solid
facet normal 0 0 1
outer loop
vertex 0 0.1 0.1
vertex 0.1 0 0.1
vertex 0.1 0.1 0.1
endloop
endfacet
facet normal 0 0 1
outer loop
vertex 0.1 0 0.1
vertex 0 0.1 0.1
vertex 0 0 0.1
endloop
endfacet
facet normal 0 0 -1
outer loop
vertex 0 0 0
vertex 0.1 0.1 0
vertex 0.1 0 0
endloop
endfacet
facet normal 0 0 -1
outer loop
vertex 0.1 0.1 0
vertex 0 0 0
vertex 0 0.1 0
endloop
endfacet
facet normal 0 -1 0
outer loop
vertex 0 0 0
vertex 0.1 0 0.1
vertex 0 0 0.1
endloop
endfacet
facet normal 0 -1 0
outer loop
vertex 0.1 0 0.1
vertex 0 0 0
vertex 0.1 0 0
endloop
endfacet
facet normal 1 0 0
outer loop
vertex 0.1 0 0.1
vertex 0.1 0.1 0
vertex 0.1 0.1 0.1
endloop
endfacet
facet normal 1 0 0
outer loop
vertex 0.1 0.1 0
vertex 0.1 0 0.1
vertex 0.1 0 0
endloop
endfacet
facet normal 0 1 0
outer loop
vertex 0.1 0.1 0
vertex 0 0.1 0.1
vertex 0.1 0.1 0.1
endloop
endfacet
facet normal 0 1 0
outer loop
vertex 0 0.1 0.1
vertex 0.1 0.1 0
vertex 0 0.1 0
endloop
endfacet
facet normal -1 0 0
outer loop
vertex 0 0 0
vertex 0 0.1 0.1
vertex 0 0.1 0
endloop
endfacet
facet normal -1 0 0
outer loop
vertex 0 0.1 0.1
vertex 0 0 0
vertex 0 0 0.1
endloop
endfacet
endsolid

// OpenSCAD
// Tests for snapware-lid-holder.scad
// Run: openscad -o /tmp/x.stl snapware-lid-holder-test.scad
//      (add -D 'Pack="..."' / -D Set_quantity=2 etc. to test other configs)
// Non-zero exit = a test failed (assert aborts on first failure).

include <snapware-lid-holder.scad>
Piece = 99;   // suppress model geometry; tests only

// --- A: preset counts match the cited catalog listings (container totals) ---
echo(str("A: totals current=", sum(current), " 2016=", sum(old2016),
         " 2015=", sum(old2015), " 2014=", sum(old2014), " expected 19/18/15/19"));
assert(sum(current) == 19 && sum(old2016) == 18 && sum(old2015) == 15 && sum(old2014) == 19,
       "A FAIL: preset totals differ from catalog listings");

// --- B: every channel exists exactly once across pieces ---
echo(str("B: channels=", n_ch, " in pieces=", sum([for (pc = pieces) len(pc)])));
assert(sum([for (pc = pieces) len(pc)]) == n_ch, "B FAIL: channels lost or duplicated");

// --- C: lid fronts flush at Z=0; each channel has a stop exactly at its rail
// depth (Stop + L - Front_overhang) in some stop station of its piece ---
for (pc = pieces) for (k = [0:len(pc)-1]) let(r = stop_z(pc[k]),
    hits = [for (st = piece_stations(pc)) for (sk = station_stops(pc, st)) if (sk[0] == k) sk[1]]) {
  echo(str("C: ", names[pc[k][1]], " L=", pc[k][0], " stop at ", hits, " expected ", r));
  assert(len(hits) == 1 && abs(hits[0] - r) < eps, str("C FAIL: ", names[pc[k][1]], " stop missing/duplicated"));
  assert(abs(r - Stop_thickness - (clamp_mode ? (pc[k][0] + pc[k][2])/2 : pc[k][0]) + Front_overhang) < eps, "C FAIL: lid front not on the front line");
  // Whole clamp sits over this channel's ledge rail (front station .. stop).
  cs = clamp_span(pc[k]);
  echo(str("C: clamp ", cs, " rail support 0..", r - Stop_thickness));
  assert(cs[0] >= -Front_overhang - eps && cs[1] <= r - Stop_thickness + eps, "C FAIL: clamp not fully on rail");
}

// --- R: Station_length of hook in front of the stop wall (under the clamp's
// rear end) and exactly Stop_tail behind it ---
for (pc = pieces) for (k = [0:len(pc)-1]) let(sz = stop_z(pc[k]),
    st = [for (st = piece_stations(pc)) if (len([for (sk = station_stops(pc, st)) if (sk[0] == k) 1]) > 0) st][0],
    front = sz - Stop_thickness - st[0], behind = seg_end(pc, st, k) - sz) {
  echo(str("R: ", names[pc[k][1]], " hook ", front, " | stop ", Stop_thickness, " | ", behind));
  assert(front >= Station_length - eps && abs(behind - Stop_tail) < eps, "R FAIL: hook around the stop wall");
}

// --- C2: channels sorted by stop depth, deepest first, within and across pieces ---
if (n_ch > 1) for (k = [1:n_ch-1]) assert(stop_z(channels[k]) <= stop_z(channels[k-1]) + eps, "C2 FAIL: channels not sorted by stop depth");

// --- D: pieces fit on the print bed ---
for (k = [0:n_pieces-1]) {
  W = piece_width(k) + 2*edge_ext; Lp = piece_length(pieces[k]) + sock_ro;
  echo(str("D: piece ", k+1, " footprint ", W, " x ", Lp, " max ", max_print_width, " x ", max_print_depth));
  assert(W <= max_print_width && Lp <= max_print_depth, "D FAIL: piece exceeds bed");
}

// --- E: screw (mount station) spacing along Z within Max_mount_spacing ---
for (k = [1:len(mount_sts)-1]) let(g = st_zc(mount_sts[k]) - st_zc(mount_sts[k-1])) {
  echo(str("E: mount gap ", g, " max ", Max_mount_spacing));
  assert(g <= Max_mount_spacing + eps, "E FAIL: mounts too far apart");
}

// --- O: along every channel, the clear gap between consecutive hooks it
// rides on is <= Clamp_contact_length - 2*Clamp_min_engagement ---
for (pc = pieces) for (k = [0:len(pc)-1]) let(r = rail(pc[k]),
    sts = [for (st = piece_stations(pc)) if (kept(pc, st, k)) [st[0], seg_end(pc, st, k)]])
  for (j = [1:len(sts)-1]) let(g = sts[j][0] - sts[j-1][1]) {
    echo(str("O: ", names[pc[k][1]], " gap ", g, " max ", gap_max(pc[k])));
    assert(g <= gap_max(pc[k]) + eps, "O FAIL: clamp can't bridge the gap between hooks");
  }

if (fit) let(sts = piece_stations(pieces[0])) {
  echo(str("O: fit test stations ", len(sts), " gap ", sts[1][0] - sts[0][1], " = ", fit_gap, " (max ", max_gap, " - margin)"));
  assert(len(sts) == 2 && abs(sts[1][0] - sts[0][1] - fit_gap) < eps, "O FAIL: fit test gap");
}

// --- F: stations disjoint and in order; front station at Z=0 ---
assert(stations[0][0] >= -eps, "F FAIL: station in front of Z=0");
for (k = [1:len(stations)-1]) assert(stations[k][0] >= stations[k-1][1] - eps, "F FAIL: stations overlap");

// --- M: ledge rail top is flush with the station ledge (clamp rides on it),
// and its slot-side face is flush with the hooks' ledge edge ---
echo(str("M: rail x ", rail_x - Strip_width/2, "..", rail_x + Strip_width/2,
         " slot edge ", 10*sx + Lead_in, " ledge tip ", 16*sx, " top ", ledge_top, " = ", 26*sy));
assert(abs(rail_x - Strip_width/2 - (10*sx + Lead_in)) < eps && rail_x + Strip_width/2 <= 16*sx, "M FAIL: rail not flush with the ledge edge");

// --- G: joined pieces share their joint stations (spacing + parallelism) ---
if (n_pieces > 1) for (k = [0:n_pieces-2]) let(a = piece_mounts(pieces[k]), b = piece_mounts(pieces[k+1])) {
  echo(str("G: piece ", k+1, " mounts ", len(a), " piece ", k+2, " mounts ", len(b)));
  assert(len(b) >= 2, "G FAIL: fewer than 2 joints -> parallelism not guaranteed");
  assert(len(b) <= len(a) && [for (j = [0:len(b)-1]) a[j]] == b, "G FAIL: joint stations misaligned");
  for (st = b) assert(span(pieces[k], st) == len(pieces[k]), "G FAIL: joint station not full width on left piece");
}

// --- K: step bosses sit against the last pillar like edge bosses, within the
// shorter neighbour's slot + cavity, behind its clamp/stop ---
echo(str("K: step boss x ", step_off - boss_r, "..", step_off + boss_r, " from station edge; neighbour cavity ends at ", 13*sx));
assert(step_off - boss_r < 0 && step_off + boss_r <= 13*sx + eps, "K FAIL: step boss x");
for (pc = pieces) for (st = piece_mounts(pc)) let(n = span(pc, st)) if (n < len(pc)) {
  clear = st_zc(st) - boss_r - rail(pc[n]);
  echo(str("K: step boss at z ", st_zc(st), " clears neighbour stop (", rail(pc[n]), ") by ", clear));
  assert(clear >= 0.5 - eps, "K FAIL: step boss hits neighbour clamp/stop");
}
for (k = [1:len(mount_sts)-1]) let(g = st_zc(mount_sts[k]) - st_zc(mount_sts[k-1])) {
  // Socket spacing only matters on multi-piece racks; else tubes must not touch.
  echo(str("K: boss zc gap ", g, " >= ", min_screw_step));
  assert(g >= min_screw_step - eps && min_screw_step >= 2*boss_r + 1 - eps &&
         (n_pieces == 1 || min_screw_step >= 2*sock_ro + 1 - eps), "K FAIL: bosses/sockets overlap");
}

// --- N: nothing behind a stop: every station part of a channel starts in front
// of that channel's stop and ends at or before it; the shortest channel of the
// selection gets exactly front + stop stations (plus spacing fills) ---
for (pc = pieces) for (k = [0:len(pc)-1]) let(r = rail(pc[k]),
    sts = [for (st = piece_stations(pc)) if (kept(pc, st, k)) st]) {
  for (st = sts) assert(st[0] < r - eps && seg_end(pc, st, k) <= r + eps, "N FAIL: station behind a stop");
  // A full station skips only channels that already stopped.
  for (st = piece_stations(pc)) if (st[3] && k >= span(pc, st)) assert(r <= st[0] + eps, "N FAIL: full station skips a passing channel");
}

// --- P: at rest the clamp's rear end sits Station_length on its stop hook,
// and the clamp also rests on at least one other hook by >= Clamp_min_engagement ---
if (!fit) for (pc = pieces) for (k = [0:len(pc)-1]) let(cs = clamp_span(pc[k]),
    segs = [for (st = piece_stations(pc)) if (kept(pc, st, k)) [st[0], seg_end(pc, st, k)]],
    rr = [for (sg = segs) if (sg[0] <= cs[1] - SL + eps && sg[1] >= cs[1] - eps) sg],
    other = [for (sg = segs) if (rr == [] || sg != rr[0]) let(o = min(sg[1], cs[1]) - max(sg[0], cs[0])) if (o >= Clamp_min_engagement - eps) o]) {
  echo(str("P: ", names[pc[k][1]], " clamp ", cs, " stop hook ", len(rr), " other hooks under clamp ", other));
  assert(len(rr) == 1 && len(other) >= 1, "P FAIL: clamp not held by its stop hook plus another hook");
}

// --- S: intermediate screws: <= Channels_per_screw lids and <= gap_w_max lid
// weight between screws on every screwed crossbar; each column boss sits
// between lid b-1's clamp cavity and lid b's slot (Step_clearance from both)
// and inside the crossbar's length ---
if (!fit) for (pc = pieces) {
  for (b = cols(pc)) let(lo = col_x(pc, b) - boss_r, hi = col_x(pc, b) + boss_r,
      cav = ch_x(pc, b - 1) + 18*sx, slot = ch_x(pc, b) + 5*sx) {
    echo(str("S: column after lid ", b, " boss x ", lo, "..", hi, " cavity ends ", cav, " slot starts ", slot));
    assert(lo >= cav + Step_clearance - eps && hi <= slot - Step_clearance + eps, "S FAIL: column boss in lid space");
  }
  for (st = piece_mounts(pc)) let(n = span(pc, st), cs = col_screws(pc, st),
      bounds = concat([trim_of(pc, st)], [for (b = cs) if (b < n && b > trim_of(pc, st)) b], [n]), cw = cum_w(pc, n)) {
    echo(str("S: crossbar ", st[0], "..", st[1], " over ", n, " lids, screws after lid ", cs));
    for (j = [1:len(bounds)-1]) {
      g = bounds[j] - bounds[j-1];
      assert(g >= 1 && g <= Channels_per_screw, "S FAIL: too many lids between screws");
      assert(g == 1 || cw[bounds[j]] - cw[bounds[j-1]] <= gap_w_max + eps, "S FAIL: too much weight between screws");
    }
    for (b = cs) let(zb = kept(pc, st, b) ? min(seg_end(pc, st, b - 1), seg_end(pc, st, b)) : seg_end(pc, st, b - 1))
      assert(st_zc(st) - Screw_head_diameter/2 >= st[0] - eps && st_zc(st) + Screw_head_diameter/2 <= zb + eps,
             "S FAIL: column screw outside its crossbar");
  }
}

// --- H: socket captures the male boss but clears it ---
echo(str("H: boss_r=", boss_r, " socket ri=", sock_ri, " opening half-width=", sock_open_hw,
         " opening plane ", sock_cut, " vs neighbour wall ", -boss_off));
assert(sock_ri > boss_r, "H FAIL: no joint clearance");
assert(sock_open_hw < boss_r - 0.5, "H FAIL: boss can slip out of socket");
assert(sock_cut > -boss_off, "H FAIL: socket collides with neighbour station");
// Opening must clear the boss-to-wall web (chord where tube meets wall).
web_hw = sqrt(boss_r*boss_r - boss_off*boss_off);
echo(str("H: web half-width ", web_hw, " < opening ", sock_open_hw));
assert(web_hw < sock_open_hw, "H FAIL: socket opening narrower than boss web");

// --- I: fasteners ---
echo(str("I: countersink depth ", cs_depth, " seat ", Mount_thickness, " bore ", Driver_bore_diameter,
         " head ", Screw_head_diameter));
assert(cs_depth <= Mount_thickness - 1.5 && Driver_bore_diameter >= Screw_head_diameter + 1, "I FAIL");

// --- J: walls are 0.6 mm nozzle multiples ---
for (t = [Boss_wall, Socket_wall, Strip_width, Stop_thickness]) {
  echo(str("J: wall ", t));
  assert(abs(t/0.6 - round(t/0.6)) < 1e-6, str("J FAIL: ", t, " not a 0.6 multiple"));
}
echo("ALL TESTS PASSED");
cube(0.1);   // non-empty output so the exit code reflects the asserts
